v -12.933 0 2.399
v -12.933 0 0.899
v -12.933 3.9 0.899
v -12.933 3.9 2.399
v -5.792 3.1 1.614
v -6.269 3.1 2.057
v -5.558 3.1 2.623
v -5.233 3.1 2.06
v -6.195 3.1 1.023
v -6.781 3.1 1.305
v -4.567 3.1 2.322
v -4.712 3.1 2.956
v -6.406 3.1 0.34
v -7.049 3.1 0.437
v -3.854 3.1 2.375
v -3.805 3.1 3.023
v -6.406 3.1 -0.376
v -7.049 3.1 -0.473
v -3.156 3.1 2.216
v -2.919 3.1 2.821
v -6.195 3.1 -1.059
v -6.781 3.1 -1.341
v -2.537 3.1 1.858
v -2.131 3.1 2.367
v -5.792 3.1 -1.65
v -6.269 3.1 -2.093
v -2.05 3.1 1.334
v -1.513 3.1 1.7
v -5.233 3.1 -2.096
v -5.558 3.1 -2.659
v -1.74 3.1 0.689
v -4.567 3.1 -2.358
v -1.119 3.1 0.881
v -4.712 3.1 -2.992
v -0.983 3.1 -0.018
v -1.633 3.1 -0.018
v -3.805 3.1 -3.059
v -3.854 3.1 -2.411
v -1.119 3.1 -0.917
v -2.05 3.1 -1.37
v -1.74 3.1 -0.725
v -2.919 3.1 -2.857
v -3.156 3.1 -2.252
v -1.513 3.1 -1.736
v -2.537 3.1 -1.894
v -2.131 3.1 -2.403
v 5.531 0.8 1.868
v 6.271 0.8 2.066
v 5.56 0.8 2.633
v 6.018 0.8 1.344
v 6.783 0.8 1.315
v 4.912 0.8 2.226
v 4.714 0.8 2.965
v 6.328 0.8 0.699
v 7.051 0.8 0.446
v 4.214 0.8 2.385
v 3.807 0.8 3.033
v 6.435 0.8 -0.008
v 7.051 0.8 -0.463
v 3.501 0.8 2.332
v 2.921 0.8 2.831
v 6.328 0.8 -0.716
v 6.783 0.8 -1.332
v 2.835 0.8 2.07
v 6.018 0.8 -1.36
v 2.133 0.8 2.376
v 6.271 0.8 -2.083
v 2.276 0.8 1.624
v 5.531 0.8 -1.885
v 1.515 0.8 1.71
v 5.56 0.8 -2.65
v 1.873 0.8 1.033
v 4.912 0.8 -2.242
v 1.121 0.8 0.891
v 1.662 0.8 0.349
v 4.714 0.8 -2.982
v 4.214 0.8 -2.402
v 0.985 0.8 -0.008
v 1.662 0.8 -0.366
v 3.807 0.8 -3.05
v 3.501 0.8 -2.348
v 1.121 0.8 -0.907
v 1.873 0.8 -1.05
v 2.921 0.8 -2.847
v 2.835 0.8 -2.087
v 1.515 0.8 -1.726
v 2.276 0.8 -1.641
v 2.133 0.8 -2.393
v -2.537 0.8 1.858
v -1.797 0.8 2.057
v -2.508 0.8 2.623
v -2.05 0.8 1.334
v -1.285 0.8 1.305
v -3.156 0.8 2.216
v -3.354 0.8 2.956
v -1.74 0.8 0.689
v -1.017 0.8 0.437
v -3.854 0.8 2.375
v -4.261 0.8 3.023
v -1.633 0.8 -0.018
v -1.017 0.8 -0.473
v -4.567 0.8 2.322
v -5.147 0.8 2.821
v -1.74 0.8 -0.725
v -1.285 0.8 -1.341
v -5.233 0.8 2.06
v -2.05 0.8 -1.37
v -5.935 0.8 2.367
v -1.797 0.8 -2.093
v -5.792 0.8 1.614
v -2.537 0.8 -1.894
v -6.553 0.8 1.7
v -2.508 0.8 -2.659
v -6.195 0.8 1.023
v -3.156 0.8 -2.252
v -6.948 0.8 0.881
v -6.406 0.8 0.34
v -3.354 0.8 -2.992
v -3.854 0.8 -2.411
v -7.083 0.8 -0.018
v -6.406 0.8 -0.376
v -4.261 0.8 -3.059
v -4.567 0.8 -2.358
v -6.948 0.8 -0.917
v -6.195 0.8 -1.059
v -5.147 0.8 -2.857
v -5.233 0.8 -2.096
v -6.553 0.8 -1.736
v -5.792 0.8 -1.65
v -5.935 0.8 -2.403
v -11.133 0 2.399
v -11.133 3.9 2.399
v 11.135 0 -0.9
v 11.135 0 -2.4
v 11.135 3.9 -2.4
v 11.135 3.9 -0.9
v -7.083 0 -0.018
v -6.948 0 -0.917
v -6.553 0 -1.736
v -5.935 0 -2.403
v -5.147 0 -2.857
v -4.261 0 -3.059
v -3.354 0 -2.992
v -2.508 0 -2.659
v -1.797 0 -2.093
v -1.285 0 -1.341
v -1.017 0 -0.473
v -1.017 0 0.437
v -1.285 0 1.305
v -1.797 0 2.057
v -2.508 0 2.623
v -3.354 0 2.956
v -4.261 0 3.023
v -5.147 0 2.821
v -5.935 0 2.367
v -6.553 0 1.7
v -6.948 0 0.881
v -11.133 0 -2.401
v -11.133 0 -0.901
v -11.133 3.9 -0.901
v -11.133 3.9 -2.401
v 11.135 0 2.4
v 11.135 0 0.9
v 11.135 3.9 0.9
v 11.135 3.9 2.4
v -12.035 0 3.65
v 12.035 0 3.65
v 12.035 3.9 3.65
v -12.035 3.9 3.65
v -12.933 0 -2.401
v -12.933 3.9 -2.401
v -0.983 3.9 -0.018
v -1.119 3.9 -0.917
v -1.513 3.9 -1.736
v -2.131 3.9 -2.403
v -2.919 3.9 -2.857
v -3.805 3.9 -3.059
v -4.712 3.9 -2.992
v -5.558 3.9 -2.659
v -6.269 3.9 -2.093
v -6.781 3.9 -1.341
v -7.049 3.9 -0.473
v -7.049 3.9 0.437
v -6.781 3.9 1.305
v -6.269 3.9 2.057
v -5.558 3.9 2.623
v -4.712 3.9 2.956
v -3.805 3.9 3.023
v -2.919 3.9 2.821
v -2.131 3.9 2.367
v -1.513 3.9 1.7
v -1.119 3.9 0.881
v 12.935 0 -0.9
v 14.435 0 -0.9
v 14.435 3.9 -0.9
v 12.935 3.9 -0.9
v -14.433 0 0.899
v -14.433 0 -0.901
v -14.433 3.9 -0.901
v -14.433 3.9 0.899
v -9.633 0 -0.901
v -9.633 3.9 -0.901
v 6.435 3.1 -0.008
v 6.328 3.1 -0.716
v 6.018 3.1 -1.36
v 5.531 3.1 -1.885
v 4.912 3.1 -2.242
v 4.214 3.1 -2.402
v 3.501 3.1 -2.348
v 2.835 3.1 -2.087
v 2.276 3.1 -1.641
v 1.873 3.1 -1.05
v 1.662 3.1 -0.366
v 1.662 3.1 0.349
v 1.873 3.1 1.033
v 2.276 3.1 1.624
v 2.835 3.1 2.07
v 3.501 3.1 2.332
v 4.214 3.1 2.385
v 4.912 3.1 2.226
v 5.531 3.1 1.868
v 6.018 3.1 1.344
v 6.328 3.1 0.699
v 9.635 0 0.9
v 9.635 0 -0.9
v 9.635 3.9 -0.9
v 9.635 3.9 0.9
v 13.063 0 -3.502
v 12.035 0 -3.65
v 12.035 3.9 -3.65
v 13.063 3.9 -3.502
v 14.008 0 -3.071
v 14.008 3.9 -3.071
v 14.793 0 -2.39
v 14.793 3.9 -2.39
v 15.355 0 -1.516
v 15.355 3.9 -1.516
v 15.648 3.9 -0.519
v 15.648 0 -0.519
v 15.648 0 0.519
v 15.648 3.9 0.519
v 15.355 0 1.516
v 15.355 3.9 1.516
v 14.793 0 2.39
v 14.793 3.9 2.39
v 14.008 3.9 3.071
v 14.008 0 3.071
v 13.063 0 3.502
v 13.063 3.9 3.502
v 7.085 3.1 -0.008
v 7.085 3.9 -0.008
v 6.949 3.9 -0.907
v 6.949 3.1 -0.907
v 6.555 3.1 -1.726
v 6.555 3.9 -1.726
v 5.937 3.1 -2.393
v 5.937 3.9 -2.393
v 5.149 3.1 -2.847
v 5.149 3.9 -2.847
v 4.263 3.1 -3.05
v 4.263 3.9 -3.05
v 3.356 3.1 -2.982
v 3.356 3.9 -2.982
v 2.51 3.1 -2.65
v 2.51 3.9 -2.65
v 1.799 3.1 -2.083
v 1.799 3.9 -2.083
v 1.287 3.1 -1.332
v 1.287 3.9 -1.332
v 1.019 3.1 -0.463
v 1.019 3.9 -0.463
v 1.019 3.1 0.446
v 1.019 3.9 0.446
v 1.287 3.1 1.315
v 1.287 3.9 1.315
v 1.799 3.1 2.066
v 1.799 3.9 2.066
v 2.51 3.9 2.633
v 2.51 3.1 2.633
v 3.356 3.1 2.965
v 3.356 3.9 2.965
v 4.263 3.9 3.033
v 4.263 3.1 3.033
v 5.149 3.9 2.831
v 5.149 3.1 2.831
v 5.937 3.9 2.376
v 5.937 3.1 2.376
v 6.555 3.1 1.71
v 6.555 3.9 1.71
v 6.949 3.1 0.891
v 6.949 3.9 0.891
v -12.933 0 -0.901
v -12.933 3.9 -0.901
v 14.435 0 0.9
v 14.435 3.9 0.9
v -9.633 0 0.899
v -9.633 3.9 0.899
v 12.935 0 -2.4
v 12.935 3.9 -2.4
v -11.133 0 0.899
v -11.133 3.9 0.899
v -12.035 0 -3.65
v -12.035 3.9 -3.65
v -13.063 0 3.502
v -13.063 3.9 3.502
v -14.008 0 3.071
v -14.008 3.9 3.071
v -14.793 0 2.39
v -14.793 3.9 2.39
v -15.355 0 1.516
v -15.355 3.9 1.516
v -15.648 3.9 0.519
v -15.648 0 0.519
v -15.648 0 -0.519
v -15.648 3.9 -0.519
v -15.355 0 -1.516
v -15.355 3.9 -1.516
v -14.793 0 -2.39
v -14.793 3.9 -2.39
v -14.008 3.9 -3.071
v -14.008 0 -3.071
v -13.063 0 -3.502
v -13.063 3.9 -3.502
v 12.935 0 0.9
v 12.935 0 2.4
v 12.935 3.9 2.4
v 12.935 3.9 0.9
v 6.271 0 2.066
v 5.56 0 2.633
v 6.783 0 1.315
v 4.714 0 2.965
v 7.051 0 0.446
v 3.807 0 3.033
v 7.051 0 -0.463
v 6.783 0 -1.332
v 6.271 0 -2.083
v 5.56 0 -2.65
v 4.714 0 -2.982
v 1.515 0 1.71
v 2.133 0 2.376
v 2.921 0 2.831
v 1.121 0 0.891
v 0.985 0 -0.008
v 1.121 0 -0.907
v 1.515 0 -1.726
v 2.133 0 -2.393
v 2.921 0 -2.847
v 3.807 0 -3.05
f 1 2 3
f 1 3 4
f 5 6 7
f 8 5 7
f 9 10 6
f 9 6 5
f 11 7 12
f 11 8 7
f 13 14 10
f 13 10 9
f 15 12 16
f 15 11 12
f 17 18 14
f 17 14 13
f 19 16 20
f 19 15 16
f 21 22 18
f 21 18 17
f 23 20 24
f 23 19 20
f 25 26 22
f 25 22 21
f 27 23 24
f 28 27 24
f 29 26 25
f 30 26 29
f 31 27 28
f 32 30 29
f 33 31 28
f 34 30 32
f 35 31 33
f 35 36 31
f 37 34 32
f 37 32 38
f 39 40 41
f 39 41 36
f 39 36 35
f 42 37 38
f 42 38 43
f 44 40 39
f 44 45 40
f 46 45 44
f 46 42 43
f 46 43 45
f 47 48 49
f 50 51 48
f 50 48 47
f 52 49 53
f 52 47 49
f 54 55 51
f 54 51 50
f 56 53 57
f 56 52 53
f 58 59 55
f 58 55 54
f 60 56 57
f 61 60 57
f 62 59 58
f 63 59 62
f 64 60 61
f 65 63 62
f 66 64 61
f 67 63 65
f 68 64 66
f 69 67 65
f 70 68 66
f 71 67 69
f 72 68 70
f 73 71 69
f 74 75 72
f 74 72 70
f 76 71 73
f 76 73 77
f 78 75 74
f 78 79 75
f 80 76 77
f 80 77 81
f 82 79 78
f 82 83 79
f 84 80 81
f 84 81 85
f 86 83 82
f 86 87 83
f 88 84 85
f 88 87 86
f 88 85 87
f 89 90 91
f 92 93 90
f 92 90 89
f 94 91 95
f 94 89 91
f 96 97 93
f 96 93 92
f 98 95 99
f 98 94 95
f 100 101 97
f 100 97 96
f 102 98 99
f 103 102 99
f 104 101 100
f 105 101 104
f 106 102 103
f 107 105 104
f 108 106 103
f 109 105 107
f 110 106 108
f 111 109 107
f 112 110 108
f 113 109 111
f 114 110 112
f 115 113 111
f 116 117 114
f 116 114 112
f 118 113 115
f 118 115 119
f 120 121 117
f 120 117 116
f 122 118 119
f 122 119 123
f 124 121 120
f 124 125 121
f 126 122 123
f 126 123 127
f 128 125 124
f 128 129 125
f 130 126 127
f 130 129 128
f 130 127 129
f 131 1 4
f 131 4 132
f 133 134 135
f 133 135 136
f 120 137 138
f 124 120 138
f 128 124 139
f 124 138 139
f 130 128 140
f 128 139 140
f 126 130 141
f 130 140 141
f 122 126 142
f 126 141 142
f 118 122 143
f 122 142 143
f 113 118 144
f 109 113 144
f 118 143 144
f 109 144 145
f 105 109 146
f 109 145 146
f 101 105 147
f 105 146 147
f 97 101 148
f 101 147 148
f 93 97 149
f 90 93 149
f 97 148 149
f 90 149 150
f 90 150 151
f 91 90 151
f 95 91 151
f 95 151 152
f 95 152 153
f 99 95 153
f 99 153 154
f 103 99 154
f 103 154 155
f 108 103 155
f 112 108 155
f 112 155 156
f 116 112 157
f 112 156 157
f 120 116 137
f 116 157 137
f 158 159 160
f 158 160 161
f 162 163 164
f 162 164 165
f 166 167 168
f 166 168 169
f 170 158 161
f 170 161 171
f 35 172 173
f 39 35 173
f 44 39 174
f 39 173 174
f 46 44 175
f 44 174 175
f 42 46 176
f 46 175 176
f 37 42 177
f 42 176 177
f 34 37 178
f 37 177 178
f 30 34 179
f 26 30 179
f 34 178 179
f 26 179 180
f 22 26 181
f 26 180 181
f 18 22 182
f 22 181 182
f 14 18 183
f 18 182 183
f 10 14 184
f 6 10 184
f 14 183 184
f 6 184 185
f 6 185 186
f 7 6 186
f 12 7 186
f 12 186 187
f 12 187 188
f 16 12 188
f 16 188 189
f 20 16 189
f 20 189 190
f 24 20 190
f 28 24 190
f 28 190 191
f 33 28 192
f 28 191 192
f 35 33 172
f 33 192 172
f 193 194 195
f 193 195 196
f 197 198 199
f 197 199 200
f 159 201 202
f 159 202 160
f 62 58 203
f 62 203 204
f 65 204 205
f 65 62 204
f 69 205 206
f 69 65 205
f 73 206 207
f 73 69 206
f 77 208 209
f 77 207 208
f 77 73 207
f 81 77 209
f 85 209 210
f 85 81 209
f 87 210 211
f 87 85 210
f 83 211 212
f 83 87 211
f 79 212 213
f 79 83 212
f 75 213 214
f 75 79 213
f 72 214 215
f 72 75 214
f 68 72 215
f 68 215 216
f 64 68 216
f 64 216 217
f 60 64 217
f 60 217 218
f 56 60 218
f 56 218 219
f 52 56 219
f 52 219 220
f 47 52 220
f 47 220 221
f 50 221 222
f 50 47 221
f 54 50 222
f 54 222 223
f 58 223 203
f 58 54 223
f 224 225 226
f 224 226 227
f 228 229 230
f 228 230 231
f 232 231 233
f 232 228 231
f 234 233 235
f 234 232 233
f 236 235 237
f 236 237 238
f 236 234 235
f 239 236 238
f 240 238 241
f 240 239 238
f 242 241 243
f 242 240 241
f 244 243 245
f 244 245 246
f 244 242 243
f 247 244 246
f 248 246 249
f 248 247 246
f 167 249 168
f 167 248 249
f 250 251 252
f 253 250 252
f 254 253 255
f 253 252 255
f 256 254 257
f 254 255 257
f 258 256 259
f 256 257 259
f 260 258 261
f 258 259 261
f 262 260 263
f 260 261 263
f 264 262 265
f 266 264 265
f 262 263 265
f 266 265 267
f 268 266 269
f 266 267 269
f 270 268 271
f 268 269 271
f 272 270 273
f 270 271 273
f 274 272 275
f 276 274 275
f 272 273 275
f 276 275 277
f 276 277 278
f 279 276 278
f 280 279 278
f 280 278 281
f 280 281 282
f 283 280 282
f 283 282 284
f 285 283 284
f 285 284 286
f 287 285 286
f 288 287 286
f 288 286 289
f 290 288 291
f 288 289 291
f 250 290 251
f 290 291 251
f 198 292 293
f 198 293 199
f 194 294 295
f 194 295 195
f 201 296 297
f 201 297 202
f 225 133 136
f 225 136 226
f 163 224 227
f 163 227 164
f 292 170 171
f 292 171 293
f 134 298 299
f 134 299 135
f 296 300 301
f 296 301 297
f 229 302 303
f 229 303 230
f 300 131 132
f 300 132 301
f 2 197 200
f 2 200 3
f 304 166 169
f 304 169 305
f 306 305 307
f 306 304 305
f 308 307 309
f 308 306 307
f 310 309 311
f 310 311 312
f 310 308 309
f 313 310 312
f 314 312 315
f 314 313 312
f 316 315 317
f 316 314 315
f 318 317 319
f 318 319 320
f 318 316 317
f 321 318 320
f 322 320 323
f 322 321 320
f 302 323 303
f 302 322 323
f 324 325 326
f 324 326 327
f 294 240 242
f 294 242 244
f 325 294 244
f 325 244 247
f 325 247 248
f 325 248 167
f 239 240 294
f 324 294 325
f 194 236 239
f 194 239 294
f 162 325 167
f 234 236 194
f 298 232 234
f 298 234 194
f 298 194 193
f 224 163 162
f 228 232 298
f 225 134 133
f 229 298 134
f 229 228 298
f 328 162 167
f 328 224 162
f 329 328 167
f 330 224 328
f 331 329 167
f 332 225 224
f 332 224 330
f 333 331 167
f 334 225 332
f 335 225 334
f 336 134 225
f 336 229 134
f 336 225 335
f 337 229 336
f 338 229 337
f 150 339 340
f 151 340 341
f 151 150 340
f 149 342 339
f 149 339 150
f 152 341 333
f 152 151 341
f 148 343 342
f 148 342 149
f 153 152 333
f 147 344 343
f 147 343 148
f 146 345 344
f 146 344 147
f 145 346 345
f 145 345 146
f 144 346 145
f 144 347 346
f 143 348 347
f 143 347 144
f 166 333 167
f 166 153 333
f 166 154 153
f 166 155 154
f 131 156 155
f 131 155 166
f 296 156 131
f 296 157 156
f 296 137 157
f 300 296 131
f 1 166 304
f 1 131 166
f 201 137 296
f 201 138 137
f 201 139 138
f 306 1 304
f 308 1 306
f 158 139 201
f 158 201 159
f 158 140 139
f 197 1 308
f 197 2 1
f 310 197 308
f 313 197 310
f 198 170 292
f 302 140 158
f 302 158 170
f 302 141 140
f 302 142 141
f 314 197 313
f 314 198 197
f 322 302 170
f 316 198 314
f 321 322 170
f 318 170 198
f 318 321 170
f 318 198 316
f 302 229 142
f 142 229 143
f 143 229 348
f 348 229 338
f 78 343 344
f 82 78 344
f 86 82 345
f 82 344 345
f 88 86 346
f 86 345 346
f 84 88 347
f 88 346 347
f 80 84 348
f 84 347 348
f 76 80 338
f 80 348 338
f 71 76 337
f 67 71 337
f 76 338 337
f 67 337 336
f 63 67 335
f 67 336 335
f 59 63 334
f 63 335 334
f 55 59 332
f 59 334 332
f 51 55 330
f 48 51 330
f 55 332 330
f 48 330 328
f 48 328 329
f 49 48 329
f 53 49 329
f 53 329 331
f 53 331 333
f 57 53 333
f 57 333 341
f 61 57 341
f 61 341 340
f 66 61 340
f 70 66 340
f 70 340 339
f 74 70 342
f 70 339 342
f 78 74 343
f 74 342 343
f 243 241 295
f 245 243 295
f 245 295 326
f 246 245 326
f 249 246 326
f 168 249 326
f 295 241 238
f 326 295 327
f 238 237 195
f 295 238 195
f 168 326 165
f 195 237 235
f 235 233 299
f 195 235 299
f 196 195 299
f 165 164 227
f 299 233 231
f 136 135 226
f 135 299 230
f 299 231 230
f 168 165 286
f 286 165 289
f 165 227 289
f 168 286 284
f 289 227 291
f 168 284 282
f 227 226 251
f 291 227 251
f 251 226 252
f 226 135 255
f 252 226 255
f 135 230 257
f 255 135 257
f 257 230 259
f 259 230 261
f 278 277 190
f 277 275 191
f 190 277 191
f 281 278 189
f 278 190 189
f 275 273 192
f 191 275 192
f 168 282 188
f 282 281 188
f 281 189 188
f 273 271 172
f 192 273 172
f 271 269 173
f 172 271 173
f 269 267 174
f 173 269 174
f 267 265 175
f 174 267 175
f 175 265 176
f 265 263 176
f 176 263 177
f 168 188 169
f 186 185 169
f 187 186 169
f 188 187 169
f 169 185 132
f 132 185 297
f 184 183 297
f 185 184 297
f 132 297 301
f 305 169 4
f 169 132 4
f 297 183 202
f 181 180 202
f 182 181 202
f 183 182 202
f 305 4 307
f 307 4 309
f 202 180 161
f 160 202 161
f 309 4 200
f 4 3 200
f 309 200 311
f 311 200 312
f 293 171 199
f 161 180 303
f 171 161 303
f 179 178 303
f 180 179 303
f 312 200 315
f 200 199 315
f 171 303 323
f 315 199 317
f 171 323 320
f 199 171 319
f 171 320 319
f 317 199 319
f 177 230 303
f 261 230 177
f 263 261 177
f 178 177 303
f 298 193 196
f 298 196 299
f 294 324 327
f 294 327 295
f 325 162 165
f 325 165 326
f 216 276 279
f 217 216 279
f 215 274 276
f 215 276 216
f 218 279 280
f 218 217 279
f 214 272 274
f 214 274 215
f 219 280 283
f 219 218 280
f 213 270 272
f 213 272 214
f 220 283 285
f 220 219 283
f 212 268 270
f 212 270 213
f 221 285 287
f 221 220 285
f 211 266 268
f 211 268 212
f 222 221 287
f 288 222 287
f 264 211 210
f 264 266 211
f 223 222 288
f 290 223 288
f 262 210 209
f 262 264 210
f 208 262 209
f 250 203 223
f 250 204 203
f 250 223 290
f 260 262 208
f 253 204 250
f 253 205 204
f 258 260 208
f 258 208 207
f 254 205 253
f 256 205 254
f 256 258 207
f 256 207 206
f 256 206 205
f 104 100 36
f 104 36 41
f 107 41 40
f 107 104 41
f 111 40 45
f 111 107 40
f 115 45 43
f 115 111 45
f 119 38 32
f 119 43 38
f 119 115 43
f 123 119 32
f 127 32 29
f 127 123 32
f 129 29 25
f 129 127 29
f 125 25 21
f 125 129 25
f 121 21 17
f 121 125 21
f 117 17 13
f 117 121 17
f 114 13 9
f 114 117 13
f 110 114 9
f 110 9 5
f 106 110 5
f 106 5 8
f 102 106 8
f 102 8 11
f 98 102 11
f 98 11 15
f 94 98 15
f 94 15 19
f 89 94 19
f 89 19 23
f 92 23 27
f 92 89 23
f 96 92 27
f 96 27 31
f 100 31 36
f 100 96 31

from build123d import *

# Parameters (mm, degrees)
SKETCH1_R           = 2.4
BOSS_EXTRUDE1_DEPTH = 3.9
SKETCH2_R           = 3.05
CUT_EXTRUDE1_DEPTH  = 0.8
SKETCH3_R           = 3.05
CUT_EXTRUDE2_DEPTH  = 0.8


with BuildPart() as part:
    # Sketch1 → Boss-Extrude1 (new body)
    with BuildSketch(Plane(origin=(0, 0, 0), x_dir=(1, 0, 0), z_dir=(0, 1, 0))):
        with BuildLine():
            Line((-12.035, 3.65), (12.035, 3.65))
            ThreePointArc((12.035, 3.65), (15.685, 0), (12.035, -3.65))
            Line((12.035, -3.65), (-12.035, -3.65))
            ThreePointArc((-12.035, -3.65), (-15.685, 0), (-12.035, 3.65))
        make_face()
        with Locations((-4.033060202, 0.018008222)):
            Circle(SKETCH1_R, mode=Mode.SUBTRACT)
        with Locations((4.035, 0.008270612)):
            Circle(SKETCH1_R, mode=Mode.SUBTRACT)
        Polygon((11.135, 2.4), (11.135, 0.9), (9.635, 0.9), (9.635, -0.9), (11.135, -0.9), (11.135, -2.4), (12.935, -2.4), (12.935, -0.9), (14.435, -0.9), (14.435, 0.9), (12.935, 0.9), (12.935, 2.4), align=None, mode=Mode.SUBTRACT)
        Polygon((-12.933060202, 2.401087844), (-12.933060202, 0.901087844), (-14.433060202, 0.901087844), (-14.433060202, -0.898912156), (-12.933060202, -0.898912156), (-12.933060202, -2.398912156), (-11.133060202, -2.398912156), (-11.133060202, -0.898912156), (-9.633060202, -0.898912156), (-9.633060202, 0.901087844), (-11.133060202, 0.901087844), (-11.133060202, 2.401087844), align=None, mode=Mode.SUBTRACT)
    extrude(amount=BOSS_EXTRUDE1_DEPTH)

    # Sketch2 → Cut-Extrude1 (cut)
    with BuildSketch(Plane(origin=(0, 3.9, 0), x_dir=(1, 0, 0), z_dir=(0, 1, 0))):
        with Locations((4.035, 0.008270612)):
            Circle(SKETCH2_R)
        with Locations((-4.033060202, 0.018008222)):
            Circle(SKETCH2_R)
    extrude(amount=-CUT_EXTRUDE1_DEPTH, mode=Mode.SUBTRACT)

    # Sketch3 → Cut-Extrude2 (cut)
    with BuildSketch(Plane(origin=(0, 0, 0), x_dir=(-1, 0, 0), z_dir=(0, -1, 0))):
        with Locations((4.033060202, 0.018008222)):
            Circle(SKETCH3_R)
        with Locations((-4.035, 0.008270612)):
            Circle(SKETCH3_R)
    extrude(amount=-CUT_EXTRUDE2_DEPTH, mode=Mode.SUBTRACT)


solid = part.part
